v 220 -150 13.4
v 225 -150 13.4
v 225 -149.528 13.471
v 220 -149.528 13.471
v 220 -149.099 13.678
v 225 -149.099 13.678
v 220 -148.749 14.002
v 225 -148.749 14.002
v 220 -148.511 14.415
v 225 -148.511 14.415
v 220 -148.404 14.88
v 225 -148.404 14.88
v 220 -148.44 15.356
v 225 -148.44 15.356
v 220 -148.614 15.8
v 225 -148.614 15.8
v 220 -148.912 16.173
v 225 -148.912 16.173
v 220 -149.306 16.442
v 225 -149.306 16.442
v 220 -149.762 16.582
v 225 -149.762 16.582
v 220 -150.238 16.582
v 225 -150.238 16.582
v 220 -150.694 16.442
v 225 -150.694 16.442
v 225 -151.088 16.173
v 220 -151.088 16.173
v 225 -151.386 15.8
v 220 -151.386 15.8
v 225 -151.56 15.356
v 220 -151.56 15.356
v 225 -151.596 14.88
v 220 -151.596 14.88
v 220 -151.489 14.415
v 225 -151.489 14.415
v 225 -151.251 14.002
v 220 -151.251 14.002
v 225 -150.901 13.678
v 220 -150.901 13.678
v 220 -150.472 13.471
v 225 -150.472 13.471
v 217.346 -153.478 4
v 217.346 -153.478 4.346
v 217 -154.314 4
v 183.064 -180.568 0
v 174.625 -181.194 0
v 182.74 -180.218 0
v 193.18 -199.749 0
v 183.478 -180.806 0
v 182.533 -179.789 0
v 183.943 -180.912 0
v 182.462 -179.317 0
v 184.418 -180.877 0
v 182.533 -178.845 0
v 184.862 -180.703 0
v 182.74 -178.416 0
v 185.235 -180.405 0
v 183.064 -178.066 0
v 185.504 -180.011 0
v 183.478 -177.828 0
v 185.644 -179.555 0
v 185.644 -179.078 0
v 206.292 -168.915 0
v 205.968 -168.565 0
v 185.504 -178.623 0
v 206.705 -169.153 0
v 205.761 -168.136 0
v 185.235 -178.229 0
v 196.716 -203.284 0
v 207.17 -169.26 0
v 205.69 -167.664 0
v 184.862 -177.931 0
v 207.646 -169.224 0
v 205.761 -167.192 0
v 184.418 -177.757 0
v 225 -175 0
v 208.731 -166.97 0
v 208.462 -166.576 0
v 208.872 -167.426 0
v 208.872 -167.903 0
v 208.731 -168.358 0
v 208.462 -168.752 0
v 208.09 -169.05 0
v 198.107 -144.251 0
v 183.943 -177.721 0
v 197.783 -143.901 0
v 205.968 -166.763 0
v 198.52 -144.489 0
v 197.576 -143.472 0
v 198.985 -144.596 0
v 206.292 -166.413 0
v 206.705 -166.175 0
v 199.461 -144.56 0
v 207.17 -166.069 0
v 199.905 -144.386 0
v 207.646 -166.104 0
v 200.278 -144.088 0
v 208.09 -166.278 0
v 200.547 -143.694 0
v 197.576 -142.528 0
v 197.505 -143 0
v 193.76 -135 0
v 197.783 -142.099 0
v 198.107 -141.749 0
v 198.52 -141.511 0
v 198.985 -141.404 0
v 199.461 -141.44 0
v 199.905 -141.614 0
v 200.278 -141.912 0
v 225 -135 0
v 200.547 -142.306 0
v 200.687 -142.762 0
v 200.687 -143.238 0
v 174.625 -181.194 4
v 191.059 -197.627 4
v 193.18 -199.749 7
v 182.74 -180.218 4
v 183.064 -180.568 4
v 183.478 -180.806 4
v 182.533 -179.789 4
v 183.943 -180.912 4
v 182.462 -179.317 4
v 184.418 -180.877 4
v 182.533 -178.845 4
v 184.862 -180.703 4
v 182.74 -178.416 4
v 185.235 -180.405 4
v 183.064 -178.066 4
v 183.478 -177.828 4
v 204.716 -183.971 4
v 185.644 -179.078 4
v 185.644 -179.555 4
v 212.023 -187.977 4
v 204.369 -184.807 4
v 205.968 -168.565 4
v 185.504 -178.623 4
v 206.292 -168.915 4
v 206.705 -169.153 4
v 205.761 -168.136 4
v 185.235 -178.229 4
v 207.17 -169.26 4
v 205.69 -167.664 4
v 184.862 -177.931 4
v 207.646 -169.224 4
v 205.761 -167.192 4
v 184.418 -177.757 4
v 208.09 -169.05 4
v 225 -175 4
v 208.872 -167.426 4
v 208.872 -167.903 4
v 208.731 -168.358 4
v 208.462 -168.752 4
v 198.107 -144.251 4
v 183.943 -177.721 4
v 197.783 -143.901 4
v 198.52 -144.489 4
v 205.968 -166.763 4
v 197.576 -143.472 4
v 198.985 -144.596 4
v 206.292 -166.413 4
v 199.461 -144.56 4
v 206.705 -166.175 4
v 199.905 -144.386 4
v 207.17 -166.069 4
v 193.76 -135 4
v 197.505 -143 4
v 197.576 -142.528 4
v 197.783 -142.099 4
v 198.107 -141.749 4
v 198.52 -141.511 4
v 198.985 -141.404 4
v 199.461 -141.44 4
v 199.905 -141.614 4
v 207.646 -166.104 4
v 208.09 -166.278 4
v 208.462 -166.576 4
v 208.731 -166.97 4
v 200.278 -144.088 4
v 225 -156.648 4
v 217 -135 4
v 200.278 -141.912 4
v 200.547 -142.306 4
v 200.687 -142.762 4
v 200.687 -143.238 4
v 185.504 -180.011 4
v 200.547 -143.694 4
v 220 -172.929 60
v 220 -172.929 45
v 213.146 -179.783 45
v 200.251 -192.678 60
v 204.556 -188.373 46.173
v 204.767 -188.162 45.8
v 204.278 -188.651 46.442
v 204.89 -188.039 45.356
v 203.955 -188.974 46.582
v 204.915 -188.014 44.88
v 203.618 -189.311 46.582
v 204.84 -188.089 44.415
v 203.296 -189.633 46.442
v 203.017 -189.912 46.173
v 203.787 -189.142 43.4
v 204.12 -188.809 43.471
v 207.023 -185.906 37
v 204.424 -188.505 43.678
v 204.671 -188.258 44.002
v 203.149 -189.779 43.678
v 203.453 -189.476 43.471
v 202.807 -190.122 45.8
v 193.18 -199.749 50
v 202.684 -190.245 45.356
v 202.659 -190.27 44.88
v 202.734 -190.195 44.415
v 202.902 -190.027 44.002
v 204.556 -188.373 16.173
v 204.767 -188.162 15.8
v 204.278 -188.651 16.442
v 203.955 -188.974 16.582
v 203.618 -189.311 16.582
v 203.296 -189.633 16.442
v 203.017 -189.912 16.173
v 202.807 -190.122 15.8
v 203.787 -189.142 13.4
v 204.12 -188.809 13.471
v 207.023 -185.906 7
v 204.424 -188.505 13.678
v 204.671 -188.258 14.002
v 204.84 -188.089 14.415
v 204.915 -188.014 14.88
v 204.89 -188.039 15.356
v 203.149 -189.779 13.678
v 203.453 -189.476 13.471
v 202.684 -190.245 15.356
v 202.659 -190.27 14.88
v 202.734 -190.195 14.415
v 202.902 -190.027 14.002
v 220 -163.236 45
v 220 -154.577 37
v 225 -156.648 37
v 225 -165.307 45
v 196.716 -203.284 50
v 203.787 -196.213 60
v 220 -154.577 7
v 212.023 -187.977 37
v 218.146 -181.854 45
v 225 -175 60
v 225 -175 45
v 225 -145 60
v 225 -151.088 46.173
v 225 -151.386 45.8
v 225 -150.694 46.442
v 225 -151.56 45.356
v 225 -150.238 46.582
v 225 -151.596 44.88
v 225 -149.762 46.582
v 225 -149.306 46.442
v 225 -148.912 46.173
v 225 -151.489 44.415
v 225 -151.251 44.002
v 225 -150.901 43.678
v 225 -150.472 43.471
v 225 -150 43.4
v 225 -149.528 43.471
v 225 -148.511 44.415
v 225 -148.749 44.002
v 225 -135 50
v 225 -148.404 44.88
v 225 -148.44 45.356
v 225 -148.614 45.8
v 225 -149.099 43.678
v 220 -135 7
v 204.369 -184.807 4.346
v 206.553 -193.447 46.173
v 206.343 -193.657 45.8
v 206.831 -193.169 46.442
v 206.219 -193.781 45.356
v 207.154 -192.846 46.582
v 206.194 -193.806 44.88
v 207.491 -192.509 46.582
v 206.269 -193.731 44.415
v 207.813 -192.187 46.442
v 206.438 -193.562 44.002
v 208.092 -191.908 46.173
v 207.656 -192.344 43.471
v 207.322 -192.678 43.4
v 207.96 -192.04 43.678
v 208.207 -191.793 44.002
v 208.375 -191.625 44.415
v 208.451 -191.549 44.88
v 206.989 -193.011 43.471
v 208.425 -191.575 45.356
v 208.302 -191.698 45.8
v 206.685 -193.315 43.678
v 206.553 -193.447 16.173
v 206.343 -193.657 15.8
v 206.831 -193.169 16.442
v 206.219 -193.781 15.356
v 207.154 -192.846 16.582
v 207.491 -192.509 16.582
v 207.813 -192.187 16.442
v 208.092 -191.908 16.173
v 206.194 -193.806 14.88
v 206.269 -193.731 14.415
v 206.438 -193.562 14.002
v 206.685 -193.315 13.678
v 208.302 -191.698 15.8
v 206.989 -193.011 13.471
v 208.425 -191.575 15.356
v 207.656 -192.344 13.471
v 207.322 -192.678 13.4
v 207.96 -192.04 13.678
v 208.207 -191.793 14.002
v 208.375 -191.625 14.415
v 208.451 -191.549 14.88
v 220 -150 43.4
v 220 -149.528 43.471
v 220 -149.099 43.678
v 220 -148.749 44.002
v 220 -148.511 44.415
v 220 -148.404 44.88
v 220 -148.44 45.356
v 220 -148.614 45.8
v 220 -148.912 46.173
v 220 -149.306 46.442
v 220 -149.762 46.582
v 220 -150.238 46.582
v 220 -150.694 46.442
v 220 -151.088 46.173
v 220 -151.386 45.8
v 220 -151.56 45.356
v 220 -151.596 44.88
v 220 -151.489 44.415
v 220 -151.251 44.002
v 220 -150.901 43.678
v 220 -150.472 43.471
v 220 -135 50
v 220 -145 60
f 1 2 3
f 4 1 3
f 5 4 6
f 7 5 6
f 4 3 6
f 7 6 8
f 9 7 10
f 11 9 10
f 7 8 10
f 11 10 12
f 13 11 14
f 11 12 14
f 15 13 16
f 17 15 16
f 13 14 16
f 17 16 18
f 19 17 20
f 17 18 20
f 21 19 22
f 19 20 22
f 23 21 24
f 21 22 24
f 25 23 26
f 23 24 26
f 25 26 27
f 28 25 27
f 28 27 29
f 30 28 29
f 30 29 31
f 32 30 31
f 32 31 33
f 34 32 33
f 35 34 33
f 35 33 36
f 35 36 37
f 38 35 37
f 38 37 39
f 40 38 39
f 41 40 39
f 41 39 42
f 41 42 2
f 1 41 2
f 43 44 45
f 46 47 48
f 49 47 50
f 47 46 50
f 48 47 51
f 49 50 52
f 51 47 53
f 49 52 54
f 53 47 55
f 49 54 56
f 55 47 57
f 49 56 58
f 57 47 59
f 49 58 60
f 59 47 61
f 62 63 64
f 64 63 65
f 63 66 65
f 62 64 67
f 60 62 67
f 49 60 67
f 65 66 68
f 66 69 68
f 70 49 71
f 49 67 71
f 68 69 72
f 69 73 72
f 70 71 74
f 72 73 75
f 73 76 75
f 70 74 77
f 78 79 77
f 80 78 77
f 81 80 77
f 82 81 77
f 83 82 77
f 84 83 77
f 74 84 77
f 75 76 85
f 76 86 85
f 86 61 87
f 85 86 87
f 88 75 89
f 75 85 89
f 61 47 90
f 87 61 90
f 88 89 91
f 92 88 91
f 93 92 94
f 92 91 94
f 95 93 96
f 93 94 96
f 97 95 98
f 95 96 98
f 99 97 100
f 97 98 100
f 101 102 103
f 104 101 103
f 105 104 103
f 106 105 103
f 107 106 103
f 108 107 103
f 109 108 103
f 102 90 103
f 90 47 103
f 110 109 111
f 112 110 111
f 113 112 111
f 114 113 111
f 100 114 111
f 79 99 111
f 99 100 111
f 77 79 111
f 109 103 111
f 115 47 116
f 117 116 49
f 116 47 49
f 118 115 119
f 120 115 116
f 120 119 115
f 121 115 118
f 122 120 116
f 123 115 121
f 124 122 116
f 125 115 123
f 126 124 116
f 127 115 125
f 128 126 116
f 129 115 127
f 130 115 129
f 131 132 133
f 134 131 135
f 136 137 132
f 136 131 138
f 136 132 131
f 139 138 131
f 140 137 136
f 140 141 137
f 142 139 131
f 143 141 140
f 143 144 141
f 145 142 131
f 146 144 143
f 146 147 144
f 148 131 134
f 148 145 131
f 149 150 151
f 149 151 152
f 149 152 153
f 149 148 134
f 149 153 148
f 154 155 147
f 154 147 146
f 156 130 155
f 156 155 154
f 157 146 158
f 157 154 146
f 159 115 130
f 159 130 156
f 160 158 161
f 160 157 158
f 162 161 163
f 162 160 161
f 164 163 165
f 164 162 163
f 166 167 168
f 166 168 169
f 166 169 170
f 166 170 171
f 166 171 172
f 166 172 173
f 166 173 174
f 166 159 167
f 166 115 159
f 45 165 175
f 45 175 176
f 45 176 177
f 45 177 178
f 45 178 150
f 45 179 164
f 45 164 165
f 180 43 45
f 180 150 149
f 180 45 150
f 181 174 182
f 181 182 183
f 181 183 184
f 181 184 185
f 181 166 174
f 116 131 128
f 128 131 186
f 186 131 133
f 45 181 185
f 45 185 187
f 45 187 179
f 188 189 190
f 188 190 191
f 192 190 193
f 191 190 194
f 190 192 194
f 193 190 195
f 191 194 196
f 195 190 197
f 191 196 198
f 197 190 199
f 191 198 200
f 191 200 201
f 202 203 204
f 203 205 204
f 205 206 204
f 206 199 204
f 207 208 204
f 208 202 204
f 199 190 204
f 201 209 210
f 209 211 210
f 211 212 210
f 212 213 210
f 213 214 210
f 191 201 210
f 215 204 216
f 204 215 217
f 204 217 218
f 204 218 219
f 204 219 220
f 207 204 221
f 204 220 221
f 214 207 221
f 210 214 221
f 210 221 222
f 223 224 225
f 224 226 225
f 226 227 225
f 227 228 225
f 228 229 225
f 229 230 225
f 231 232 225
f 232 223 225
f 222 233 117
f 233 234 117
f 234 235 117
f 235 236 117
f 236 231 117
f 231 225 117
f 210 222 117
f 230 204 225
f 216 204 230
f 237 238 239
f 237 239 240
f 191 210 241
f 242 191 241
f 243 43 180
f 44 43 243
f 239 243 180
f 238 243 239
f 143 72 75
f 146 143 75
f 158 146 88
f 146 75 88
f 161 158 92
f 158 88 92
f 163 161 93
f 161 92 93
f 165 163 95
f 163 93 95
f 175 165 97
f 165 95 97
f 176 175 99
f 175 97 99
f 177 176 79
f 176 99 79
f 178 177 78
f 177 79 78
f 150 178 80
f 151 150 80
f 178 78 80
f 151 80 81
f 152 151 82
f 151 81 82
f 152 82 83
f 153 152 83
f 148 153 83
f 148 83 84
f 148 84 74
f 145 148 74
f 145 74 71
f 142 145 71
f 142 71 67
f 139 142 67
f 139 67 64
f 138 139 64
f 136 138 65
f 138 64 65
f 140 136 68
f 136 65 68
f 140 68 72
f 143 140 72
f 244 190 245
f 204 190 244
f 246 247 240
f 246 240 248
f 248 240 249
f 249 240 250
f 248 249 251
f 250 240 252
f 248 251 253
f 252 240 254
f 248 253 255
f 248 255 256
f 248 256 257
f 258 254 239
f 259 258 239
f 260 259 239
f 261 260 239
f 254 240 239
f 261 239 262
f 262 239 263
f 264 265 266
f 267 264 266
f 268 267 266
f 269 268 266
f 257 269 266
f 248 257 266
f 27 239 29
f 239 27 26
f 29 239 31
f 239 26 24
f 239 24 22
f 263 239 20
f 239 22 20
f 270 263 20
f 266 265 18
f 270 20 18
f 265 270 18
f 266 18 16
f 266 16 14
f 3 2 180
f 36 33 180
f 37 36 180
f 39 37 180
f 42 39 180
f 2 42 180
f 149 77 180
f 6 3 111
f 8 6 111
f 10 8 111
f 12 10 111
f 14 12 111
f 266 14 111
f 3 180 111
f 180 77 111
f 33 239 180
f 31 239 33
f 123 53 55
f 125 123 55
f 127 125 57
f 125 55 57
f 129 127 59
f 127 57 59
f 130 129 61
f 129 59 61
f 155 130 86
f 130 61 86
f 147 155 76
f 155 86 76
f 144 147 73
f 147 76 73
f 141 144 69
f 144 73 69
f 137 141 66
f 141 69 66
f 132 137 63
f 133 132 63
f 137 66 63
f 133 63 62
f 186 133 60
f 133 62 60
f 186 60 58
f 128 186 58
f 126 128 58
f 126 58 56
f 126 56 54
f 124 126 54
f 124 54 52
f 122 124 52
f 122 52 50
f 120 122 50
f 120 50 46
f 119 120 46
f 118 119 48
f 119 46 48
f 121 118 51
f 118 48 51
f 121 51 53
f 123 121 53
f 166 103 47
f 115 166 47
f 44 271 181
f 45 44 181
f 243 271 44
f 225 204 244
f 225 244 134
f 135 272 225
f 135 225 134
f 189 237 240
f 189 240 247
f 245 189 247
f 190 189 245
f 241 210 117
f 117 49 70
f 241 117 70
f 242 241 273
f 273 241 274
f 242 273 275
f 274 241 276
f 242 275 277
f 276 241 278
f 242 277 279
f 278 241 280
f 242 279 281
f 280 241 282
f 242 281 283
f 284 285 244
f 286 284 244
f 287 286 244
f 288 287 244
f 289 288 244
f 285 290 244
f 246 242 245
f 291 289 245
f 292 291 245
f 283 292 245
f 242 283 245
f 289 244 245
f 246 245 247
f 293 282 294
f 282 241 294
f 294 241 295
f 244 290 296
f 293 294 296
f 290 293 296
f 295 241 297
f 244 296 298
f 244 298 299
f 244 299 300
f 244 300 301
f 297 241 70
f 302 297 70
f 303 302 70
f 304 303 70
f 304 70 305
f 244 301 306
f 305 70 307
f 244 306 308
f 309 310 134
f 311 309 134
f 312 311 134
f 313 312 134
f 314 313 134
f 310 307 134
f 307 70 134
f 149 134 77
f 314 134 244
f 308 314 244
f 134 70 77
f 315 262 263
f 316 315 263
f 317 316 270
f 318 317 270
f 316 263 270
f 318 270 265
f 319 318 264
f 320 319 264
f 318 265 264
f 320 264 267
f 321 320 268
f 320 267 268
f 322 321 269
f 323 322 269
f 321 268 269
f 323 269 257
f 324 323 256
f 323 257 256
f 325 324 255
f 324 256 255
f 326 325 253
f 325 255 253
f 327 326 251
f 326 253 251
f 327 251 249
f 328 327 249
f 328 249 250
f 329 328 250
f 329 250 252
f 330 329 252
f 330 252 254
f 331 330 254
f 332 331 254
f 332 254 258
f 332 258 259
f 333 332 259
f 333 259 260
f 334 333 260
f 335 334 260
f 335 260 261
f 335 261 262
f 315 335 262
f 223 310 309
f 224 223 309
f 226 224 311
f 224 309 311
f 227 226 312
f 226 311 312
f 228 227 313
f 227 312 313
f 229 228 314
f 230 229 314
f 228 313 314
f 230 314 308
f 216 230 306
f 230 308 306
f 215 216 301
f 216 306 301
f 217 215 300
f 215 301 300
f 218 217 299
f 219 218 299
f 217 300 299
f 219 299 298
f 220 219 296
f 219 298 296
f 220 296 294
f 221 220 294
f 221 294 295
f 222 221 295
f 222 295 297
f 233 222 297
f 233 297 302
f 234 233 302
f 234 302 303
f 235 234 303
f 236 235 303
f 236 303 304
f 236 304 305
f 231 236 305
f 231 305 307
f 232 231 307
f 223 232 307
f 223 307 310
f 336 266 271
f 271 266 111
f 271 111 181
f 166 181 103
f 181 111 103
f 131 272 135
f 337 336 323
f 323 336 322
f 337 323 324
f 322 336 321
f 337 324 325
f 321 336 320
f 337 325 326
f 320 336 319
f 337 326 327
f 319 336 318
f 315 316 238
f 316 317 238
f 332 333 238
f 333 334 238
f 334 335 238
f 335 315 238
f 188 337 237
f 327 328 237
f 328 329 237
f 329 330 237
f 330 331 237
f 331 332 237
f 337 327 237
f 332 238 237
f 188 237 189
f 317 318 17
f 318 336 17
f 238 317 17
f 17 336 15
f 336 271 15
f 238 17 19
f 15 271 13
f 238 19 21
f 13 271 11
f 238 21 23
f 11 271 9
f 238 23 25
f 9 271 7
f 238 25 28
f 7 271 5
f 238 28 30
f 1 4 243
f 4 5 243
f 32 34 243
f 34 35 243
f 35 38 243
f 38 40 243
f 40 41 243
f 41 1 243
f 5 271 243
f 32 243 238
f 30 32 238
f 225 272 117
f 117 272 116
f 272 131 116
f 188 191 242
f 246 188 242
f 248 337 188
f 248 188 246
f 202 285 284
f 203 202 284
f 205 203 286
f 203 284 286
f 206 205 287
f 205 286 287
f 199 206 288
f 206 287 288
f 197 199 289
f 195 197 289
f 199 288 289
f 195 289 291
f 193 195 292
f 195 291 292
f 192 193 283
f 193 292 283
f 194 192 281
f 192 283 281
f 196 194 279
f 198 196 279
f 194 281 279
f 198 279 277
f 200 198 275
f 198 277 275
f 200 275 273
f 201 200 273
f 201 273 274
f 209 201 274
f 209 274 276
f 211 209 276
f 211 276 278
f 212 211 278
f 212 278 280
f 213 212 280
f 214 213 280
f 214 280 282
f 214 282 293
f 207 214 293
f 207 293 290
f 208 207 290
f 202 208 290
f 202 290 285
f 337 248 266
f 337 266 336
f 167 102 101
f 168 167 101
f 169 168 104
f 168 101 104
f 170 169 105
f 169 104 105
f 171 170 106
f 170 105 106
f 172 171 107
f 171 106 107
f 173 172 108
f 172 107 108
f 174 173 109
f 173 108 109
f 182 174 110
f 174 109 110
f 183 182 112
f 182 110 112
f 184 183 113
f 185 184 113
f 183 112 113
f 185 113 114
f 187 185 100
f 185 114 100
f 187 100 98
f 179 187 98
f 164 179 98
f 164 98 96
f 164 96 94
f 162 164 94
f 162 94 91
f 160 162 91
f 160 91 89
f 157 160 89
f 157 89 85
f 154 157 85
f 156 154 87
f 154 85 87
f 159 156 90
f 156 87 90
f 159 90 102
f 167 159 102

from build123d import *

# Parameters (mm, degrees)
BOSS_EXTRUDE1_DEPTH = 60
SKETCH2_R           = 1.6
BOSS_EXTRUDE2_DEPTH = 4
CHAMFER1_SIZE       = 3
SKETCH3_R           = 1.6
CUT_EXTRUDE1_DEPTH  = 8
SKETCH4_R           = 1.6
CUT_EXTRUDE2_DEPTH  = 8
CHAMFER2_SIZE       = 10
CUT_EXTRUDE3_DEPTH  = 40


with BuildPart() as part:
    # Sketch1 → Boss-Extrude1 (new body)
    with BuildSketch(Plane.XY):
        Polygon((225, -175), (225, -135), (220, -135), (220, -172.928932188), (193.180194847, -199.748737342), (196.715728753, -203.284271247), align=None)
    extrude(amount=BOSS_EXTRUDE1_DEPTH)

    # Sketch2 → Boss-Extrude2 (add)
    with BuildSketch(Plane(origin=(0, 0, 0), x_dir=(-1, 0, 0), z_dir=(0, 0, -1))):
        Polygon((-225, -135), (-193.759605749, -135), (-174.625434131, -181.193976626), (-196.715728753, -203.284271247), (-225, -175), align=None)
        with Locations((-207.289508253, -167.664074122)):
            Circle(SKETCH2_R, mode=Mode.SUBTRACT)
        with Locations((-184.062077547, -179.316911543)):
            Circle(SKETCH2_R, mode=Mode.SUBTRACT)
        with Locations((-199.105034852, -143)):
            Circle(SKETCH2_R, mode=Mode.SUBTRACT)
    extrude(amount=-BOSS_EXTRUDE2_DEPTH)

    # Chamfer1
    chamfer1_edges = [part.edges().sort_by_distance(p)[0] for p in [
        (220, -153.964466094, 4),
        (206.590097423, -186.338834765, 4),
    ]]
    chamfer(chamfer1_edges, length=CHAMFER1_SIZE)

    # Sketch3 → Cut-Extrude1 (cut)
    with BuildSketch(Plane(origin=(225, 0, 0), x_dir=(0, 0, -1), z_dir=(1, 0, 0))):
        with Locations((-45, -150)):
            Circle(SKETCH3_R)
        with Locations((-15, -150)):
            Circle(SKETCH3_R)
    extrude(amount=-CUT_EXTRUDE1_DEPTH, mode=Mode.SUBTRACT)

    # Sketch4 → Cut-Extrude2 (cut)
    with BuildSketch(Plane(origin=(200, -200, 0), x_dir=(0, 0, -1), z_dir=(0.707106781, -0.707106781, 0))):
        with Locations((-45, 10.355339059)):
            Circle(SKETCH4_R)
        with Locations((-15, 10.355339059)):
            Circle(SKETCH4_R)
    extrude(amount=-CUT_EXTRUDE2_DEPTH, mode=Mode.SUBTRACT)

    # Chamfer2
    chamfer2_edges = [part.edges().sort_by_distance(p)[0] for p in [
        (222.5, -135, 60),
        (194.9479618, -201.516504294, 60),
    ]]
    chamfer(chamfer2_edges, length=CHAMFER2_SIZE)

    # Sketch5 → Cut-Extrude3 (cut)
    with BuildSketch(Plane(origin=(239.779220614, -99.319805153, 0), x_dir=(0, 0, -1), z_dir=(0.923879533, -0.382683432, 0))):
        Polygon((-37, -58.619964607), (-45, -66.619964607), (-45, -84.530327208), (-37, -92.530327208), (-4, -92.530327208), (-4, -58.619964607), align=None)
    extrude(amount=CUT_EXTRUDE3_DEPTH, mode=Mode.SUBTRACT)


solid = part.part
